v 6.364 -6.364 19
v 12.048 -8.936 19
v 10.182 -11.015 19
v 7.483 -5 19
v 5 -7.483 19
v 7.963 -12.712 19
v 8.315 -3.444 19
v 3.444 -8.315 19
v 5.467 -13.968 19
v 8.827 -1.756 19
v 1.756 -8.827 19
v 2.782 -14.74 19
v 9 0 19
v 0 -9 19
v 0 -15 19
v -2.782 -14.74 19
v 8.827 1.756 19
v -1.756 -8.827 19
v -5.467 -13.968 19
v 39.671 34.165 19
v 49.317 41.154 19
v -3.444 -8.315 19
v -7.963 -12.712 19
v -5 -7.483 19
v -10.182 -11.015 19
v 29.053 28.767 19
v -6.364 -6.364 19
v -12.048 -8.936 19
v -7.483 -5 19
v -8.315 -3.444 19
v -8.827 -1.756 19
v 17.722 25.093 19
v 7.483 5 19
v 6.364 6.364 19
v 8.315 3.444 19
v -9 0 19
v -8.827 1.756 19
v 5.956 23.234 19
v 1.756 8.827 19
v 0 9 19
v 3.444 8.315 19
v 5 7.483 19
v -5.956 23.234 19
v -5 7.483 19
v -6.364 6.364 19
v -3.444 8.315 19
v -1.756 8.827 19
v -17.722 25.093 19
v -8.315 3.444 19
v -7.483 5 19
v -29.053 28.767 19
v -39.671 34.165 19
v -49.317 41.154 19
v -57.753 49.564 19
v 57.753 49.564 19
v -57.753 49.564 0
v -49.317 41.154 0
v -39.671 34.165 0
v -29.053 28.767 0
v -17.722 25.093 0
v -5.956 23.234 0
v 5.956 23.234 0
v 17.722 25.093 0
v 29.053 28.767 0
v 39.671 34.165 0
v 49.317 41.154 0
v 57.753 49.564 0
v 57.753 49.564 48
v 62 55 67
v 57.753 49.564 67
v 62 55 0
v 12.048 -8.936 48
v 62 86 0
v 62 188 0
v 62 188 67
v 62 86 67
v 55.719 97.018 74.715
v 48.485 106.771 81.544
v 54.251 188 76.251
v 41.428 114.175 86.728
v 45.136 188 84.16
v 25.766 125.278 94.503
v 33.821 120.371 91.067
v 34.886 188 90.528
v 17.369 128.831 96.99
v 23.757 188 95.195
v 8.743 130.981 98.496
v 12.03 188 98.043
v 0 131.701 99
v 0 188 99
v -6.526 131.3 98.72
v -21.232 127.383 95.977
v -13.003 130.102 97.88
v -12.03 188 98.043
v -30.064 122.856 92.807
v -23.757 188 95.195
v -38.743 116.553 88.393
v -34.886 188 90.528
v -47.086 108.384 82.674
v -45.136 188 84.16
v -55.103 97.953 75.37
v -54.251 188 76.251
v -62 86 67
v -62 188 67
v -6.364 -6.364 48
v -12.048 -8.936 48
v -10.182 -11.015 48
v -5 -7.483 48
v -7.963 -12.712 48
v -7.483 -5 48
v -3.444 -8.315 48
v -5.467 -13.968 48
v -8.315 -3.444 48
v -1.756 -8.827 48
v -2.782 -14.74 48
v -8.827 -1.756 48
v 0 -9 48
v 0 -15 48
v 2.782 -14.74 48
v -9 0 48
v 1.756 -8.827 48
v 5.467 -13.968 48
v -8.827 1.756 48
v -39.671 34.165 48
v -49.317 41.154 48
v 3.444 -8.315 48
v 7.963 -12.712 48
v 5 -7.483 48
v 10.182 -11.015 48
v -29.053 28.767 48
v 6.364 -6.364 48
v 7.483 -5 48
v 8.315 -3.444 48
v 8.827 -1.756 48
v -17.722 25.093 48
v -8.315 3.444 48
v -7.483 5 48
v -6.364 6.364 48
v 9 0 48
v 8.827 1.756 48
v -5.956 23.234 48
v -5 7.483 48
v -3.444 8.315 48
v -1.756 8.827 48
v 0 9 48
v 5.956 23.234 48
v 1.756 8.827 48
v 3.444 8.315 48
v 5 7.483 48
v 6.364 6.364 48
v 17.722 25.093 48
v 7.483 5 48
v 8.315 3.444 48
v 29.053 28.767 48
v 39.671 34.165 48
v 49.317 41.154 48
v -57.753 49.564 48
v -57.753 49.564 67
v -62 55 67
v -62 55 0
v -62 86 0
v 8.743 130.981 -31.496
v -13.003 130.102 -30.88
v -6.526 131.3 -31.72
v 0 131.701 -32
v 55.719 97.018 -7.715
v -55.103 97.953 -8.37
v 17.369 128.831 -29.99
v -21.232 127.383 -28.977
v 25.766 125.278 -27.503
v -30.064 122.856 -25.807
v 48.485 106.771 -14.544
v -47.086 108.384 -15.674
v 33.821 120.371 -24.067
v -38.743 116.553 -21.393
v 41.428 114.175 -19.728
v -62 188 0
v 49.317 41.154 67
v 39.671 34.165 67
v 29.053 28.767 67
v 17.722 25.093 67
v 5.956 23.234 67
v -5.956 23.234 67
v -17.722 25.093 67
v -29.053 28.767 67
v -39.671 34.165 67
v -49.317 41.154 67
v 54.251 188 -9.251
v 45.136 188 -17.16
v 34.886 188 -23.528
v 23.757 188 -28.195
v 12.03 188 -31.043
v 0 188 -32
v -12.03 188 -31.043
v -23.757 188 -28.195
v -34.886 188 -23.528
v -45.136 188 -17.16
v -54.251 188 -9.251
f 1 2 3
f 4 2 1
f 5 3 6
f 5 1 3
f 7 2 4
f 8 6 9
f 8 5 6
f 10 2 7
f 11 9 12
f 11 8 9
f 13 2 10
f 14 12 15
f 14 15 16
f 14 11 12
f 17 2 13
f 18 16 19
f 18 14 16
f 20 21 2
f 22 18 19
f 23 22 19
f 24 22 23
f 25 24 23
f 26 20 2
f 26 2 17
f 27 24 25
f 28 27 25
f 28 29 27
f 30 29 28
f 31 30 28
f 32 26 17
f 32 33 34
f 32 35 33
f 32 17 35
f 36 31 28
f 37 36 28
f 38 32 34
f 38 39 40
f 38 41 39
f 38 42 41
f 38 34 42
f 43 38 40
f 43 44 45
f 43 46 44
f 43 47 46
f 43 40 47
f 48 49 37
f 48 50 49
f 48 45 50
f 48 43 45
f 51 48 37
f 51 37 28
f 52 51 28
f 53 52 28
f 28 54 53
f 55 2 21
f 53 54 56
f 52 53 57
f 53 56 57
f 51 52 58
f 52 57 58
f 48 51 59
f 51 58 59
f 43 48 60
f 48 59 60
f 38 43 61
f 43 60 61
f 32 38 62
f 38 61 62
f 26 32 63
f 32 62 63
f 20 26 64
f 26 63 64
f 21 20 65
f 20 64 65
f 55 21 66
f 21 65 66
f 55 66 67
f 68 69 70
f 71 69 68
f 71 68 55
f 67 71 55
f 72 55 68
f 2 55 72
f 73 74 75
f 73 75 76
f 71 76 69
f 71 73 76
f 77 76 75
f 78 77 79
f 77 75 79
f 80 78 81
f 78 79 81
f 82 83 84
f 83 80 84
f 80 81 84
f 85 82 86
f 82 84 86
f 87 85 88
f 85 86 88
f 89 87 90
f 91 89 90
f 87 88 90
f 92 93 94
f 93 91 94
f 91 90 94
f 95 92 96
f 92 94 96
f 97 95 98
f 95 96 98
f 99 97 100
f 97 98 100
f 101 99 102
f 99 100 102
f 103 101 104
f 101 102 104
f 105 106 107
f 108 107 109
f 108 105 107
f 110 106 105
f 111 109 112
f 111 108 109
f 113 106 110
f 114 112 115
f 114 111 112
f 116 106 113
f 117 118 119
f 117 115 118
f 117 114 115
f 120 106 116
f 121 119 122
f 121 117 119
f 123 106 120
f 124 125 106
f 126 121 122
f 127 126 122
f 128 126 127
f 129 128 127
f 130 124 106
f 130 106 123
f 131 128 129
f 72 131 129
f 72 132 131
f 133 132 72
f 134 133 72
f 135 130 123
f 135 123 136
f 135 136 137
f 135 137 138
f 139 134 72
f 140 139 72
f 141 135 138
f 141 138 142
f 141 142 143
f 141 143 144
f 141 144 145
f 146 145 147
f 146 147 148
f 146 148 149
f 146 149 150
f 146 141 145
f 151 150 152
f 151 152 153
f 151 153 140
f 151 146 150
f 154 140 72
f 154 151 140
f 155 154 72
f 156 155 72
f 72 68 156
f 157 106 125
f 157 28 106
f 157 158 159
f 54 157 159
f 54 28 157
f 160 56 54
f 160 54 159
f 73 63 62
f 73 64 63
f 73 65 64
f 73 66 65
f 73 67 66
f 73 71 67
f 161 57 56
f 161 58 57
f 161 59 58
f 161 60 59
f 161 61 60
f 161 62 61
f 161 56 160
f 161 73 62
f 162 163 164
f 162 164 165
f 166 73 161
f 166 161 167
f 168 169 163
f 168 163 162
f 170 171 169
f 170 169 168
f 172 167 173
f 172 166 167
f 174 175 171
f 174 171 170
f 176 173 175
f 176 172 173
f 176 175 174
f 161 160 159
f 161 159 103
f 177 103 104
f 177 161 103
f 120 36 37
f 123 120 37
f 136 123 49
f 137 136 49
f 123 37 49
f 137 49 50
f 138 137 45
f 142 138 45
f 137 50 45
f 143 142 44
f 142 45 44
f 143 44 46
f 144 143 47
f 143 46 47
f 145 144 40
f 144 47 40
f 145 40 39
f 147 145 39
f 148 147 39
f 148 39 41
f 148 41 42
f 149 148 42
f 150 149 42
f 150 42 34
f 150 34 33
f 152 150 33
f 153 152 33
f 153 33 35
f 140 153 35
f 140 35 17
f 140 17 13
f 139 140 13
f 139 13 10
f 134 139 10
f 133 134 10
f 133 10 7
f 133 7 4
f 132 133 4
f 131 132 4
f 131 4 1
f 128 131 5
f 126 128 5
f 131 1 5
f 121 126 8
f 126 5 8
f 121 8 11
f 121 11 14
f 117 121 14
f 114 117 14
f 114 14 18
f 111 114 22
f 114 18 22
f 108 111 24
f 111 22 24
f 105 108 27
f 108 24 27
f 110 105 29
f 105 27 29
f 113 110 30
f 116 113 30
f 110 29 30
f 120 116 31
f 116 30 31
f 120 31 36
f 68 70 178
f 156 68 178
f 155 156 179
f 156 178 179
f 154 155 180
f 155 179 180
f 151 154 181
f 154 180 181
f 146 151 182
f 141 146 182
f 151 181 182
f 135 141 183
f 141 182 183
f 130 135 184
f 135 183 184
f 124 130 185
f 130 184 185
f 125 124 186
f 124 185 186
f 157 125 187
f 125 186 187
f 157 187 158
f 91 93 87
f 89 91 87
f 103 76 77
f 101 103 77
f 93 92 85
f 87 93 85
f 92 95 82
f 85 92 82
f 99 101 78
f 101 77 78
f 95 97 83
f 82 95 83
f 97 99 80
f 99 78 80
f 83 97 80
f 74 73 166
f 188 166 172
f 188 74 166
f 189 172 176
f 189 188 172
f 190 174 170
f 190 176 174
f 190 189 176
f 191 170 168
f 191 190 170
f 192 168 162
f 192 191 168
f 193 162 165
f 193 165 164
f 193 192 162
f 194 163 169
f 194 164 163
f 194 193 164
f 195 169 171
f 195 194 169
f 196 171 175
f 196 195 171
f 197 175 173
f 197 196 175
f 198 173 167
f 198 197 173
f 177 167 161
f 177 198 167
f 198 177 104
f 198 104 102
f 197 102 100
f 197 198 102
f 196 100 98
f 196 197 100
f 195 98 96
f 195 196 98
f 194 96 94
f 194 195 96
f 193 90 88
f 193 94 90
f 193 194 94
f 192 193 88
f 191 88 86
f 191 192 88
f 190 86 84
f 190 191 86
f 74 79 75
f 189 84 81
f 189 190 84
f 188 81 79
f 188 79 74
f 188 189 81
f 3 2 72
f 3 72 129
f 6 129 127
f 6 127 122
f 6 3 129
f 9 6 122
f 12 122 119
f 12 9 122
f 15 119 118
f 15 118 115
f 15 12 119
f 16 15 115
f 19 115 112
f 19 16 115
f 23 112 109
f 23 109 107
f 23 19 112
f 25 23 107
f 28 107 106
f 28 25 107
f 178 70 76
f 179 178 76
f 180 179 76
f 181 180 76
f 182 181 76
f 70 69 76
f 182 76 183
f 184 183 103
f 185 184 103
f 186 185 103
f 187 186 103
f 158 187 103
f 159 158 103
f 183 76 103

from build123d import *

# Parameters (mm, degrees)
EXTRUDE_1_DEPTH     = 67
SKETCH_2_OUTSIDE_W  = 175.426
SKETCH_2_OUTSIDE_H  = 254.426
CUT_EXTRUDE_1_DEPTH = 19
SKETCH_4_OUTSIDE_W  = 175.426
SKETCH_4_OUTSIDE_H  = 254.426
CUT_EXTRUDE_2_DEPTH = 19
EXTRUDE_2_DEPTH     = 102
CUT_EXTRUDE_3_DEPTH = 247.010162392
SKETCH_7_R          = 9
CUT_EXTRUDE_4_DEPTH = 214.513465618


with BuildPart() as part:
    # Эскиз1 → Бобышка-Вытянуть1 (new body)
    with BuildSketch(Plane.XY):
        with BuildLine():
            Line((-62, 55), (-62, 188))
            Line((-62, 188), (62, 188))
            Line((62, 188), (62, 55))
            Line((62, 55), (12.047963129, -8.935691604))
            ThreePointArc((12.047963129, -8.935691604), (0, -15), (-12.047963129, -8.935691604))
            Line((-12.047963129, -8.935691604), (-62, 55))
        make_face()
    extrude(amount=EXTRUDE_1_DEPTH)

    # Эскиз2 outside → Вырез-Вытянуть1 (cut)
    with BuildSketch(Plane.XY.offset(67)):
        with Locations((0, 86.5)):
            Rectangle(SKETCH_2_OUTSIDE_W, SKETCH_2_OUTSIDE_H)
        with BuildLine():
            Line((-62, 55), (-62, 188))
            Line((-62, 188), (62, 188))
            Line((62, 188), (62, 55))
            ThreePointArc((62, 55), (0, 23), (-62, 55))
        make_face(mode=Mode.SUBTRACT)
    extrude(amount=-CUT_EXTRUDE_1_DEPTH, mode=Mode.SUBTRACT)

    # Эскиз4 outside → Вырез-Вытянуть2 (cut)
    with BuildSketch(Plane(origin=(0, 0, 0), x_dir=(-1, 0, 0), z_dir=(0, 0, -1))):
        with Locations((0, 86.5)):
            Rectangle(SKETCH_4_OUTSIDE_W, SKETCH_4_OUTSIDE_H)
        with BuildLine():
            Line((-62, 55), (-62, 188))
            Line((-62, 188), (62, 188))
            Line((62, 188), (62, 55))
            ThreePointArc((62, 55), (0, 23), (-62, 55))
        make_face(mode=Mode.SUBTRACT)
    extrude(amount=-CUT_EXTRUDE_2_DEPTH, mode=Mode.SUBTRACT)

    # Эскиз5 → Бобышка-Вытянуть2 (add)
    with BuildSketch(Plane(origin=(0, 188, 0), x_dir=(1, 0, 0), z_dir=(0, 1, 0))):
        with BuildLine():
            Line((-62, 0), (62, 0))
            ThreePointArc((62, 0), (0, 32), (-62, 0))
        make_face()
        with BuildLine():
            Line((-62, -67), (62, -67))
            ThreePointArc((62, -67), (0, -99), (-62, -67))
        make_face()
    extrude(amount=-EXTRUDE_2_DEPTH)

    # Эскиз6 → Вырез-Вытянуть3 (cut, through all)
    with BuildSketch(Plane(origin=(62, 0, 0), x_dir=(0, 0, -1), z_dir=(1, 0, 0))):
        Polygon((0, 86), (32, 131.700736216), (32, 86), align=None)
        Polygon((-67, 86), (-99, 131.700736216), (-99, 86), align=None)
    extrude(amount=-CUT_EXTRUDE_3_DEPTH, mode=Mode.SUBTRACT)

    # Эскиз7 → Вырез-Вытянуть4 (cut, through all)
    with BuildSketch(Plane(origin=(0, 0, 19), x_dir=(-1, 0, 0), z_dir=(0, 0, -1))):
        Circle(SKETCH_7_R)
    extrude(amount=-CUT_EXTRUDE_4_DEPTH, mode=Mode.SUBTRACT)


solid = part.part
